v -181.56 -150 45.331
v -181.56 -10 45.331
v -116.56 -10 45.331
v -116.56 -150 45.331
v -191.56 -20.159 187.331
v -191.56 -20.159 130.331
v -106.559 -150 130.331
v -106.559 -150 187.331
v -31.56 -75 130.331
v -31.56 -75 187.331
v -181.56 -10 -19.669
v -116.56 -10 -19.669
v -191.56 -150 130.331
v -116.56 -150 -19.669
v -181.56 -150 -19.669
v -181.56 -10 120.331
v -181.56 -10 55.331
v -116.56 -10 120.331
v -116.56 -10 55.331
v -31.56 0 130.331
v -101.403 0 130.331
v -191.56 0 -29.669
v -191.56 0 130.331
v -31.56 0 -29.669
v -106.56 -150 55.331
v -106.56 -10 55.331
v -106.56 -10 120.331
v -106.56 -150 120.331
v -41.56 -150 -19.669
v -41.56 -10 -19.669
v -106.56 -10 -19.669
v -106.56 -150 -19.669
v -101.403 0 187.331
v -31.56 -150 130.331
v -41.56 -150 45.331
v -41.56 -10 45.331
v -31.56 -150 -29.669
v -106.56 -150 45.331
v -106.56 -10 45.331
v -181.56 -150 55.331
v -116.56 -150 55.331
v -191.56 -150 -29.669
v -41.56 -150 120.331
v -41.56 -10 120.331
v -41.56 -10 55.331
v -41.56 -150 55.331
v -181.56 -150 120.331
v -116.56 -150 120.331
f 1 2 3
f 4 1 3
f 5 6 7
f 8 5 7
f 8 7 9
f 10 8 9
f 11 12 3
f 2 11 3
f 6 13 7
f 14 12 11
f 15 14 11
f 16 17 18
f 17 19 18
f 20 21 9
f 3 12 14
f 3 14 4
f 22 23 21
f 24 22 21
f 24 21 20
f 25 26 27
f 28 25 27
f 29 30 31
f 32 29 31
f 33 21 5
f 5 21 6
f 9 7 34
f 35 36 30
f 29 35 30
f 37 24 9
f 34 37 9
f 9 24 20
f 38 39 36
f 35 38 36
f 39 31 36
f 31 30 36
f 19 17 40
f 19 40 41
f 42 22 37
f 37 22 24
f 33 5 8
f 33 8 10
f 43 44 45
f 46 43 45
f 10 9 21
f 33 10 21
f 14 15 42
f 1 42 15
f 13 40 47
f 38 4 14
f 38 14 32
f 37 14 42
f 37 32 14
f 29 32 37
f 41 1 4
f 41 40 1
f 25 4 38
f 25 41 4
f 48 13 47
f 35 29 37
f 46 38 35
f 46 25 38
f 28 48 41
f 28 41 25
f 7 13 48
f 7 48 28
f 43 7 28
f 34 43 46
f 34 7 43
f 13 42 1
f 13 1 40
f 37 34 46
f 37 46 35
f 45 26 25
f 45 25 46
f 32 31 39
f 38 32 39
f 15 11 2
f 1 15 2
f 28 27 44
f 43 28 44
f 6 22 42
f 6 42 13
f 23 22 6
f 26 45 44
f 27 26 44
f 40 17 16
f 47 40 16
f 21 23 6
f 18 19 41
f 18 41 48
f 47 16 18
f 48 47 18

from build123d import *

# Parameters (mm, degrees)
F0_W     = 160
F0_H     = 160
F0_W_2   = 65
F0_H_2   = 10
F0_W_3   = 10
F0_H_3   = 65
F1_DEPTH = 150
F2_W     = 10
F2_H     = 160
F3_DEPTH = 150
F5_DEPTH = 57


with BuildPart() as f1:
    # F0 (on Front) → F1 (new body)
    with BuildSketch(Plane.XZ):
        with Locations((-111.5596954525, 50.3307304141)):
            Rectangle(F0_W, F0_H)
        Polygon((-181.5596954525, 55.3307304141), (-181.5596954525, 120.3307304141), (-116.5596954525, 120.3307304141), (-106.5596954525, 120.3307304141), (-41.5596954525, 120.3307304141), (-41.5596954525, 55.3307304141), (-41.5596954525, 45.3307304141), (-41.5596954525, -19.6692695859), (-106.5596954525, -19.6692695859), (-116.5596954525, -19.6692695859), (-181.5596954525, -19.6692695859), (-181.5596954525, 45.3307304141), align=None, mode=Mode.SUBTRACT)
        with Locations((-149.0596954525, 50.3307304141)):
            Rectangle(F0_W_2, F0_H_2)
        with Locations((-111.5596954525, 87.8307304141)):
            Rectangle(F0_W_3, F0_H_3)
        with Locations((-74.0596954525, 50.3307304141)):
            Rectangle(F0_W_2, F0_H_2)
        with Locations((-111.5596954525, 12.8307304141)):
            Rectangle(F0_W_3, F0_H_3)
        with Locations((-111.5596954525, 50.3307304141)):
            Rectangle(F0_W_3, F0_H_2)
    extrude(amount=F1_DEPTH)

    # F2 (on face) → F3 (join)
    with BuildSketch(Plane.YZ.offset(-31.5596954525)):
        with Locations((-5, 50.3307304141)):
            Rectangle(F2_W, F2_H)
    extrude(amount=-F3_DEPTH)

    # F4 (on face) → F5 (join)
    with BuildSketch(Plane.XY.offset(130.3307304141)):
        Polygon((-101.4029532671, 0), (-191.5596954525, -20.1587285846), (-106.5589338541, -150), (-31.5596954525, -75), align=None)
    extrude(amount=F5_DEPTH)


solid = f1.part
